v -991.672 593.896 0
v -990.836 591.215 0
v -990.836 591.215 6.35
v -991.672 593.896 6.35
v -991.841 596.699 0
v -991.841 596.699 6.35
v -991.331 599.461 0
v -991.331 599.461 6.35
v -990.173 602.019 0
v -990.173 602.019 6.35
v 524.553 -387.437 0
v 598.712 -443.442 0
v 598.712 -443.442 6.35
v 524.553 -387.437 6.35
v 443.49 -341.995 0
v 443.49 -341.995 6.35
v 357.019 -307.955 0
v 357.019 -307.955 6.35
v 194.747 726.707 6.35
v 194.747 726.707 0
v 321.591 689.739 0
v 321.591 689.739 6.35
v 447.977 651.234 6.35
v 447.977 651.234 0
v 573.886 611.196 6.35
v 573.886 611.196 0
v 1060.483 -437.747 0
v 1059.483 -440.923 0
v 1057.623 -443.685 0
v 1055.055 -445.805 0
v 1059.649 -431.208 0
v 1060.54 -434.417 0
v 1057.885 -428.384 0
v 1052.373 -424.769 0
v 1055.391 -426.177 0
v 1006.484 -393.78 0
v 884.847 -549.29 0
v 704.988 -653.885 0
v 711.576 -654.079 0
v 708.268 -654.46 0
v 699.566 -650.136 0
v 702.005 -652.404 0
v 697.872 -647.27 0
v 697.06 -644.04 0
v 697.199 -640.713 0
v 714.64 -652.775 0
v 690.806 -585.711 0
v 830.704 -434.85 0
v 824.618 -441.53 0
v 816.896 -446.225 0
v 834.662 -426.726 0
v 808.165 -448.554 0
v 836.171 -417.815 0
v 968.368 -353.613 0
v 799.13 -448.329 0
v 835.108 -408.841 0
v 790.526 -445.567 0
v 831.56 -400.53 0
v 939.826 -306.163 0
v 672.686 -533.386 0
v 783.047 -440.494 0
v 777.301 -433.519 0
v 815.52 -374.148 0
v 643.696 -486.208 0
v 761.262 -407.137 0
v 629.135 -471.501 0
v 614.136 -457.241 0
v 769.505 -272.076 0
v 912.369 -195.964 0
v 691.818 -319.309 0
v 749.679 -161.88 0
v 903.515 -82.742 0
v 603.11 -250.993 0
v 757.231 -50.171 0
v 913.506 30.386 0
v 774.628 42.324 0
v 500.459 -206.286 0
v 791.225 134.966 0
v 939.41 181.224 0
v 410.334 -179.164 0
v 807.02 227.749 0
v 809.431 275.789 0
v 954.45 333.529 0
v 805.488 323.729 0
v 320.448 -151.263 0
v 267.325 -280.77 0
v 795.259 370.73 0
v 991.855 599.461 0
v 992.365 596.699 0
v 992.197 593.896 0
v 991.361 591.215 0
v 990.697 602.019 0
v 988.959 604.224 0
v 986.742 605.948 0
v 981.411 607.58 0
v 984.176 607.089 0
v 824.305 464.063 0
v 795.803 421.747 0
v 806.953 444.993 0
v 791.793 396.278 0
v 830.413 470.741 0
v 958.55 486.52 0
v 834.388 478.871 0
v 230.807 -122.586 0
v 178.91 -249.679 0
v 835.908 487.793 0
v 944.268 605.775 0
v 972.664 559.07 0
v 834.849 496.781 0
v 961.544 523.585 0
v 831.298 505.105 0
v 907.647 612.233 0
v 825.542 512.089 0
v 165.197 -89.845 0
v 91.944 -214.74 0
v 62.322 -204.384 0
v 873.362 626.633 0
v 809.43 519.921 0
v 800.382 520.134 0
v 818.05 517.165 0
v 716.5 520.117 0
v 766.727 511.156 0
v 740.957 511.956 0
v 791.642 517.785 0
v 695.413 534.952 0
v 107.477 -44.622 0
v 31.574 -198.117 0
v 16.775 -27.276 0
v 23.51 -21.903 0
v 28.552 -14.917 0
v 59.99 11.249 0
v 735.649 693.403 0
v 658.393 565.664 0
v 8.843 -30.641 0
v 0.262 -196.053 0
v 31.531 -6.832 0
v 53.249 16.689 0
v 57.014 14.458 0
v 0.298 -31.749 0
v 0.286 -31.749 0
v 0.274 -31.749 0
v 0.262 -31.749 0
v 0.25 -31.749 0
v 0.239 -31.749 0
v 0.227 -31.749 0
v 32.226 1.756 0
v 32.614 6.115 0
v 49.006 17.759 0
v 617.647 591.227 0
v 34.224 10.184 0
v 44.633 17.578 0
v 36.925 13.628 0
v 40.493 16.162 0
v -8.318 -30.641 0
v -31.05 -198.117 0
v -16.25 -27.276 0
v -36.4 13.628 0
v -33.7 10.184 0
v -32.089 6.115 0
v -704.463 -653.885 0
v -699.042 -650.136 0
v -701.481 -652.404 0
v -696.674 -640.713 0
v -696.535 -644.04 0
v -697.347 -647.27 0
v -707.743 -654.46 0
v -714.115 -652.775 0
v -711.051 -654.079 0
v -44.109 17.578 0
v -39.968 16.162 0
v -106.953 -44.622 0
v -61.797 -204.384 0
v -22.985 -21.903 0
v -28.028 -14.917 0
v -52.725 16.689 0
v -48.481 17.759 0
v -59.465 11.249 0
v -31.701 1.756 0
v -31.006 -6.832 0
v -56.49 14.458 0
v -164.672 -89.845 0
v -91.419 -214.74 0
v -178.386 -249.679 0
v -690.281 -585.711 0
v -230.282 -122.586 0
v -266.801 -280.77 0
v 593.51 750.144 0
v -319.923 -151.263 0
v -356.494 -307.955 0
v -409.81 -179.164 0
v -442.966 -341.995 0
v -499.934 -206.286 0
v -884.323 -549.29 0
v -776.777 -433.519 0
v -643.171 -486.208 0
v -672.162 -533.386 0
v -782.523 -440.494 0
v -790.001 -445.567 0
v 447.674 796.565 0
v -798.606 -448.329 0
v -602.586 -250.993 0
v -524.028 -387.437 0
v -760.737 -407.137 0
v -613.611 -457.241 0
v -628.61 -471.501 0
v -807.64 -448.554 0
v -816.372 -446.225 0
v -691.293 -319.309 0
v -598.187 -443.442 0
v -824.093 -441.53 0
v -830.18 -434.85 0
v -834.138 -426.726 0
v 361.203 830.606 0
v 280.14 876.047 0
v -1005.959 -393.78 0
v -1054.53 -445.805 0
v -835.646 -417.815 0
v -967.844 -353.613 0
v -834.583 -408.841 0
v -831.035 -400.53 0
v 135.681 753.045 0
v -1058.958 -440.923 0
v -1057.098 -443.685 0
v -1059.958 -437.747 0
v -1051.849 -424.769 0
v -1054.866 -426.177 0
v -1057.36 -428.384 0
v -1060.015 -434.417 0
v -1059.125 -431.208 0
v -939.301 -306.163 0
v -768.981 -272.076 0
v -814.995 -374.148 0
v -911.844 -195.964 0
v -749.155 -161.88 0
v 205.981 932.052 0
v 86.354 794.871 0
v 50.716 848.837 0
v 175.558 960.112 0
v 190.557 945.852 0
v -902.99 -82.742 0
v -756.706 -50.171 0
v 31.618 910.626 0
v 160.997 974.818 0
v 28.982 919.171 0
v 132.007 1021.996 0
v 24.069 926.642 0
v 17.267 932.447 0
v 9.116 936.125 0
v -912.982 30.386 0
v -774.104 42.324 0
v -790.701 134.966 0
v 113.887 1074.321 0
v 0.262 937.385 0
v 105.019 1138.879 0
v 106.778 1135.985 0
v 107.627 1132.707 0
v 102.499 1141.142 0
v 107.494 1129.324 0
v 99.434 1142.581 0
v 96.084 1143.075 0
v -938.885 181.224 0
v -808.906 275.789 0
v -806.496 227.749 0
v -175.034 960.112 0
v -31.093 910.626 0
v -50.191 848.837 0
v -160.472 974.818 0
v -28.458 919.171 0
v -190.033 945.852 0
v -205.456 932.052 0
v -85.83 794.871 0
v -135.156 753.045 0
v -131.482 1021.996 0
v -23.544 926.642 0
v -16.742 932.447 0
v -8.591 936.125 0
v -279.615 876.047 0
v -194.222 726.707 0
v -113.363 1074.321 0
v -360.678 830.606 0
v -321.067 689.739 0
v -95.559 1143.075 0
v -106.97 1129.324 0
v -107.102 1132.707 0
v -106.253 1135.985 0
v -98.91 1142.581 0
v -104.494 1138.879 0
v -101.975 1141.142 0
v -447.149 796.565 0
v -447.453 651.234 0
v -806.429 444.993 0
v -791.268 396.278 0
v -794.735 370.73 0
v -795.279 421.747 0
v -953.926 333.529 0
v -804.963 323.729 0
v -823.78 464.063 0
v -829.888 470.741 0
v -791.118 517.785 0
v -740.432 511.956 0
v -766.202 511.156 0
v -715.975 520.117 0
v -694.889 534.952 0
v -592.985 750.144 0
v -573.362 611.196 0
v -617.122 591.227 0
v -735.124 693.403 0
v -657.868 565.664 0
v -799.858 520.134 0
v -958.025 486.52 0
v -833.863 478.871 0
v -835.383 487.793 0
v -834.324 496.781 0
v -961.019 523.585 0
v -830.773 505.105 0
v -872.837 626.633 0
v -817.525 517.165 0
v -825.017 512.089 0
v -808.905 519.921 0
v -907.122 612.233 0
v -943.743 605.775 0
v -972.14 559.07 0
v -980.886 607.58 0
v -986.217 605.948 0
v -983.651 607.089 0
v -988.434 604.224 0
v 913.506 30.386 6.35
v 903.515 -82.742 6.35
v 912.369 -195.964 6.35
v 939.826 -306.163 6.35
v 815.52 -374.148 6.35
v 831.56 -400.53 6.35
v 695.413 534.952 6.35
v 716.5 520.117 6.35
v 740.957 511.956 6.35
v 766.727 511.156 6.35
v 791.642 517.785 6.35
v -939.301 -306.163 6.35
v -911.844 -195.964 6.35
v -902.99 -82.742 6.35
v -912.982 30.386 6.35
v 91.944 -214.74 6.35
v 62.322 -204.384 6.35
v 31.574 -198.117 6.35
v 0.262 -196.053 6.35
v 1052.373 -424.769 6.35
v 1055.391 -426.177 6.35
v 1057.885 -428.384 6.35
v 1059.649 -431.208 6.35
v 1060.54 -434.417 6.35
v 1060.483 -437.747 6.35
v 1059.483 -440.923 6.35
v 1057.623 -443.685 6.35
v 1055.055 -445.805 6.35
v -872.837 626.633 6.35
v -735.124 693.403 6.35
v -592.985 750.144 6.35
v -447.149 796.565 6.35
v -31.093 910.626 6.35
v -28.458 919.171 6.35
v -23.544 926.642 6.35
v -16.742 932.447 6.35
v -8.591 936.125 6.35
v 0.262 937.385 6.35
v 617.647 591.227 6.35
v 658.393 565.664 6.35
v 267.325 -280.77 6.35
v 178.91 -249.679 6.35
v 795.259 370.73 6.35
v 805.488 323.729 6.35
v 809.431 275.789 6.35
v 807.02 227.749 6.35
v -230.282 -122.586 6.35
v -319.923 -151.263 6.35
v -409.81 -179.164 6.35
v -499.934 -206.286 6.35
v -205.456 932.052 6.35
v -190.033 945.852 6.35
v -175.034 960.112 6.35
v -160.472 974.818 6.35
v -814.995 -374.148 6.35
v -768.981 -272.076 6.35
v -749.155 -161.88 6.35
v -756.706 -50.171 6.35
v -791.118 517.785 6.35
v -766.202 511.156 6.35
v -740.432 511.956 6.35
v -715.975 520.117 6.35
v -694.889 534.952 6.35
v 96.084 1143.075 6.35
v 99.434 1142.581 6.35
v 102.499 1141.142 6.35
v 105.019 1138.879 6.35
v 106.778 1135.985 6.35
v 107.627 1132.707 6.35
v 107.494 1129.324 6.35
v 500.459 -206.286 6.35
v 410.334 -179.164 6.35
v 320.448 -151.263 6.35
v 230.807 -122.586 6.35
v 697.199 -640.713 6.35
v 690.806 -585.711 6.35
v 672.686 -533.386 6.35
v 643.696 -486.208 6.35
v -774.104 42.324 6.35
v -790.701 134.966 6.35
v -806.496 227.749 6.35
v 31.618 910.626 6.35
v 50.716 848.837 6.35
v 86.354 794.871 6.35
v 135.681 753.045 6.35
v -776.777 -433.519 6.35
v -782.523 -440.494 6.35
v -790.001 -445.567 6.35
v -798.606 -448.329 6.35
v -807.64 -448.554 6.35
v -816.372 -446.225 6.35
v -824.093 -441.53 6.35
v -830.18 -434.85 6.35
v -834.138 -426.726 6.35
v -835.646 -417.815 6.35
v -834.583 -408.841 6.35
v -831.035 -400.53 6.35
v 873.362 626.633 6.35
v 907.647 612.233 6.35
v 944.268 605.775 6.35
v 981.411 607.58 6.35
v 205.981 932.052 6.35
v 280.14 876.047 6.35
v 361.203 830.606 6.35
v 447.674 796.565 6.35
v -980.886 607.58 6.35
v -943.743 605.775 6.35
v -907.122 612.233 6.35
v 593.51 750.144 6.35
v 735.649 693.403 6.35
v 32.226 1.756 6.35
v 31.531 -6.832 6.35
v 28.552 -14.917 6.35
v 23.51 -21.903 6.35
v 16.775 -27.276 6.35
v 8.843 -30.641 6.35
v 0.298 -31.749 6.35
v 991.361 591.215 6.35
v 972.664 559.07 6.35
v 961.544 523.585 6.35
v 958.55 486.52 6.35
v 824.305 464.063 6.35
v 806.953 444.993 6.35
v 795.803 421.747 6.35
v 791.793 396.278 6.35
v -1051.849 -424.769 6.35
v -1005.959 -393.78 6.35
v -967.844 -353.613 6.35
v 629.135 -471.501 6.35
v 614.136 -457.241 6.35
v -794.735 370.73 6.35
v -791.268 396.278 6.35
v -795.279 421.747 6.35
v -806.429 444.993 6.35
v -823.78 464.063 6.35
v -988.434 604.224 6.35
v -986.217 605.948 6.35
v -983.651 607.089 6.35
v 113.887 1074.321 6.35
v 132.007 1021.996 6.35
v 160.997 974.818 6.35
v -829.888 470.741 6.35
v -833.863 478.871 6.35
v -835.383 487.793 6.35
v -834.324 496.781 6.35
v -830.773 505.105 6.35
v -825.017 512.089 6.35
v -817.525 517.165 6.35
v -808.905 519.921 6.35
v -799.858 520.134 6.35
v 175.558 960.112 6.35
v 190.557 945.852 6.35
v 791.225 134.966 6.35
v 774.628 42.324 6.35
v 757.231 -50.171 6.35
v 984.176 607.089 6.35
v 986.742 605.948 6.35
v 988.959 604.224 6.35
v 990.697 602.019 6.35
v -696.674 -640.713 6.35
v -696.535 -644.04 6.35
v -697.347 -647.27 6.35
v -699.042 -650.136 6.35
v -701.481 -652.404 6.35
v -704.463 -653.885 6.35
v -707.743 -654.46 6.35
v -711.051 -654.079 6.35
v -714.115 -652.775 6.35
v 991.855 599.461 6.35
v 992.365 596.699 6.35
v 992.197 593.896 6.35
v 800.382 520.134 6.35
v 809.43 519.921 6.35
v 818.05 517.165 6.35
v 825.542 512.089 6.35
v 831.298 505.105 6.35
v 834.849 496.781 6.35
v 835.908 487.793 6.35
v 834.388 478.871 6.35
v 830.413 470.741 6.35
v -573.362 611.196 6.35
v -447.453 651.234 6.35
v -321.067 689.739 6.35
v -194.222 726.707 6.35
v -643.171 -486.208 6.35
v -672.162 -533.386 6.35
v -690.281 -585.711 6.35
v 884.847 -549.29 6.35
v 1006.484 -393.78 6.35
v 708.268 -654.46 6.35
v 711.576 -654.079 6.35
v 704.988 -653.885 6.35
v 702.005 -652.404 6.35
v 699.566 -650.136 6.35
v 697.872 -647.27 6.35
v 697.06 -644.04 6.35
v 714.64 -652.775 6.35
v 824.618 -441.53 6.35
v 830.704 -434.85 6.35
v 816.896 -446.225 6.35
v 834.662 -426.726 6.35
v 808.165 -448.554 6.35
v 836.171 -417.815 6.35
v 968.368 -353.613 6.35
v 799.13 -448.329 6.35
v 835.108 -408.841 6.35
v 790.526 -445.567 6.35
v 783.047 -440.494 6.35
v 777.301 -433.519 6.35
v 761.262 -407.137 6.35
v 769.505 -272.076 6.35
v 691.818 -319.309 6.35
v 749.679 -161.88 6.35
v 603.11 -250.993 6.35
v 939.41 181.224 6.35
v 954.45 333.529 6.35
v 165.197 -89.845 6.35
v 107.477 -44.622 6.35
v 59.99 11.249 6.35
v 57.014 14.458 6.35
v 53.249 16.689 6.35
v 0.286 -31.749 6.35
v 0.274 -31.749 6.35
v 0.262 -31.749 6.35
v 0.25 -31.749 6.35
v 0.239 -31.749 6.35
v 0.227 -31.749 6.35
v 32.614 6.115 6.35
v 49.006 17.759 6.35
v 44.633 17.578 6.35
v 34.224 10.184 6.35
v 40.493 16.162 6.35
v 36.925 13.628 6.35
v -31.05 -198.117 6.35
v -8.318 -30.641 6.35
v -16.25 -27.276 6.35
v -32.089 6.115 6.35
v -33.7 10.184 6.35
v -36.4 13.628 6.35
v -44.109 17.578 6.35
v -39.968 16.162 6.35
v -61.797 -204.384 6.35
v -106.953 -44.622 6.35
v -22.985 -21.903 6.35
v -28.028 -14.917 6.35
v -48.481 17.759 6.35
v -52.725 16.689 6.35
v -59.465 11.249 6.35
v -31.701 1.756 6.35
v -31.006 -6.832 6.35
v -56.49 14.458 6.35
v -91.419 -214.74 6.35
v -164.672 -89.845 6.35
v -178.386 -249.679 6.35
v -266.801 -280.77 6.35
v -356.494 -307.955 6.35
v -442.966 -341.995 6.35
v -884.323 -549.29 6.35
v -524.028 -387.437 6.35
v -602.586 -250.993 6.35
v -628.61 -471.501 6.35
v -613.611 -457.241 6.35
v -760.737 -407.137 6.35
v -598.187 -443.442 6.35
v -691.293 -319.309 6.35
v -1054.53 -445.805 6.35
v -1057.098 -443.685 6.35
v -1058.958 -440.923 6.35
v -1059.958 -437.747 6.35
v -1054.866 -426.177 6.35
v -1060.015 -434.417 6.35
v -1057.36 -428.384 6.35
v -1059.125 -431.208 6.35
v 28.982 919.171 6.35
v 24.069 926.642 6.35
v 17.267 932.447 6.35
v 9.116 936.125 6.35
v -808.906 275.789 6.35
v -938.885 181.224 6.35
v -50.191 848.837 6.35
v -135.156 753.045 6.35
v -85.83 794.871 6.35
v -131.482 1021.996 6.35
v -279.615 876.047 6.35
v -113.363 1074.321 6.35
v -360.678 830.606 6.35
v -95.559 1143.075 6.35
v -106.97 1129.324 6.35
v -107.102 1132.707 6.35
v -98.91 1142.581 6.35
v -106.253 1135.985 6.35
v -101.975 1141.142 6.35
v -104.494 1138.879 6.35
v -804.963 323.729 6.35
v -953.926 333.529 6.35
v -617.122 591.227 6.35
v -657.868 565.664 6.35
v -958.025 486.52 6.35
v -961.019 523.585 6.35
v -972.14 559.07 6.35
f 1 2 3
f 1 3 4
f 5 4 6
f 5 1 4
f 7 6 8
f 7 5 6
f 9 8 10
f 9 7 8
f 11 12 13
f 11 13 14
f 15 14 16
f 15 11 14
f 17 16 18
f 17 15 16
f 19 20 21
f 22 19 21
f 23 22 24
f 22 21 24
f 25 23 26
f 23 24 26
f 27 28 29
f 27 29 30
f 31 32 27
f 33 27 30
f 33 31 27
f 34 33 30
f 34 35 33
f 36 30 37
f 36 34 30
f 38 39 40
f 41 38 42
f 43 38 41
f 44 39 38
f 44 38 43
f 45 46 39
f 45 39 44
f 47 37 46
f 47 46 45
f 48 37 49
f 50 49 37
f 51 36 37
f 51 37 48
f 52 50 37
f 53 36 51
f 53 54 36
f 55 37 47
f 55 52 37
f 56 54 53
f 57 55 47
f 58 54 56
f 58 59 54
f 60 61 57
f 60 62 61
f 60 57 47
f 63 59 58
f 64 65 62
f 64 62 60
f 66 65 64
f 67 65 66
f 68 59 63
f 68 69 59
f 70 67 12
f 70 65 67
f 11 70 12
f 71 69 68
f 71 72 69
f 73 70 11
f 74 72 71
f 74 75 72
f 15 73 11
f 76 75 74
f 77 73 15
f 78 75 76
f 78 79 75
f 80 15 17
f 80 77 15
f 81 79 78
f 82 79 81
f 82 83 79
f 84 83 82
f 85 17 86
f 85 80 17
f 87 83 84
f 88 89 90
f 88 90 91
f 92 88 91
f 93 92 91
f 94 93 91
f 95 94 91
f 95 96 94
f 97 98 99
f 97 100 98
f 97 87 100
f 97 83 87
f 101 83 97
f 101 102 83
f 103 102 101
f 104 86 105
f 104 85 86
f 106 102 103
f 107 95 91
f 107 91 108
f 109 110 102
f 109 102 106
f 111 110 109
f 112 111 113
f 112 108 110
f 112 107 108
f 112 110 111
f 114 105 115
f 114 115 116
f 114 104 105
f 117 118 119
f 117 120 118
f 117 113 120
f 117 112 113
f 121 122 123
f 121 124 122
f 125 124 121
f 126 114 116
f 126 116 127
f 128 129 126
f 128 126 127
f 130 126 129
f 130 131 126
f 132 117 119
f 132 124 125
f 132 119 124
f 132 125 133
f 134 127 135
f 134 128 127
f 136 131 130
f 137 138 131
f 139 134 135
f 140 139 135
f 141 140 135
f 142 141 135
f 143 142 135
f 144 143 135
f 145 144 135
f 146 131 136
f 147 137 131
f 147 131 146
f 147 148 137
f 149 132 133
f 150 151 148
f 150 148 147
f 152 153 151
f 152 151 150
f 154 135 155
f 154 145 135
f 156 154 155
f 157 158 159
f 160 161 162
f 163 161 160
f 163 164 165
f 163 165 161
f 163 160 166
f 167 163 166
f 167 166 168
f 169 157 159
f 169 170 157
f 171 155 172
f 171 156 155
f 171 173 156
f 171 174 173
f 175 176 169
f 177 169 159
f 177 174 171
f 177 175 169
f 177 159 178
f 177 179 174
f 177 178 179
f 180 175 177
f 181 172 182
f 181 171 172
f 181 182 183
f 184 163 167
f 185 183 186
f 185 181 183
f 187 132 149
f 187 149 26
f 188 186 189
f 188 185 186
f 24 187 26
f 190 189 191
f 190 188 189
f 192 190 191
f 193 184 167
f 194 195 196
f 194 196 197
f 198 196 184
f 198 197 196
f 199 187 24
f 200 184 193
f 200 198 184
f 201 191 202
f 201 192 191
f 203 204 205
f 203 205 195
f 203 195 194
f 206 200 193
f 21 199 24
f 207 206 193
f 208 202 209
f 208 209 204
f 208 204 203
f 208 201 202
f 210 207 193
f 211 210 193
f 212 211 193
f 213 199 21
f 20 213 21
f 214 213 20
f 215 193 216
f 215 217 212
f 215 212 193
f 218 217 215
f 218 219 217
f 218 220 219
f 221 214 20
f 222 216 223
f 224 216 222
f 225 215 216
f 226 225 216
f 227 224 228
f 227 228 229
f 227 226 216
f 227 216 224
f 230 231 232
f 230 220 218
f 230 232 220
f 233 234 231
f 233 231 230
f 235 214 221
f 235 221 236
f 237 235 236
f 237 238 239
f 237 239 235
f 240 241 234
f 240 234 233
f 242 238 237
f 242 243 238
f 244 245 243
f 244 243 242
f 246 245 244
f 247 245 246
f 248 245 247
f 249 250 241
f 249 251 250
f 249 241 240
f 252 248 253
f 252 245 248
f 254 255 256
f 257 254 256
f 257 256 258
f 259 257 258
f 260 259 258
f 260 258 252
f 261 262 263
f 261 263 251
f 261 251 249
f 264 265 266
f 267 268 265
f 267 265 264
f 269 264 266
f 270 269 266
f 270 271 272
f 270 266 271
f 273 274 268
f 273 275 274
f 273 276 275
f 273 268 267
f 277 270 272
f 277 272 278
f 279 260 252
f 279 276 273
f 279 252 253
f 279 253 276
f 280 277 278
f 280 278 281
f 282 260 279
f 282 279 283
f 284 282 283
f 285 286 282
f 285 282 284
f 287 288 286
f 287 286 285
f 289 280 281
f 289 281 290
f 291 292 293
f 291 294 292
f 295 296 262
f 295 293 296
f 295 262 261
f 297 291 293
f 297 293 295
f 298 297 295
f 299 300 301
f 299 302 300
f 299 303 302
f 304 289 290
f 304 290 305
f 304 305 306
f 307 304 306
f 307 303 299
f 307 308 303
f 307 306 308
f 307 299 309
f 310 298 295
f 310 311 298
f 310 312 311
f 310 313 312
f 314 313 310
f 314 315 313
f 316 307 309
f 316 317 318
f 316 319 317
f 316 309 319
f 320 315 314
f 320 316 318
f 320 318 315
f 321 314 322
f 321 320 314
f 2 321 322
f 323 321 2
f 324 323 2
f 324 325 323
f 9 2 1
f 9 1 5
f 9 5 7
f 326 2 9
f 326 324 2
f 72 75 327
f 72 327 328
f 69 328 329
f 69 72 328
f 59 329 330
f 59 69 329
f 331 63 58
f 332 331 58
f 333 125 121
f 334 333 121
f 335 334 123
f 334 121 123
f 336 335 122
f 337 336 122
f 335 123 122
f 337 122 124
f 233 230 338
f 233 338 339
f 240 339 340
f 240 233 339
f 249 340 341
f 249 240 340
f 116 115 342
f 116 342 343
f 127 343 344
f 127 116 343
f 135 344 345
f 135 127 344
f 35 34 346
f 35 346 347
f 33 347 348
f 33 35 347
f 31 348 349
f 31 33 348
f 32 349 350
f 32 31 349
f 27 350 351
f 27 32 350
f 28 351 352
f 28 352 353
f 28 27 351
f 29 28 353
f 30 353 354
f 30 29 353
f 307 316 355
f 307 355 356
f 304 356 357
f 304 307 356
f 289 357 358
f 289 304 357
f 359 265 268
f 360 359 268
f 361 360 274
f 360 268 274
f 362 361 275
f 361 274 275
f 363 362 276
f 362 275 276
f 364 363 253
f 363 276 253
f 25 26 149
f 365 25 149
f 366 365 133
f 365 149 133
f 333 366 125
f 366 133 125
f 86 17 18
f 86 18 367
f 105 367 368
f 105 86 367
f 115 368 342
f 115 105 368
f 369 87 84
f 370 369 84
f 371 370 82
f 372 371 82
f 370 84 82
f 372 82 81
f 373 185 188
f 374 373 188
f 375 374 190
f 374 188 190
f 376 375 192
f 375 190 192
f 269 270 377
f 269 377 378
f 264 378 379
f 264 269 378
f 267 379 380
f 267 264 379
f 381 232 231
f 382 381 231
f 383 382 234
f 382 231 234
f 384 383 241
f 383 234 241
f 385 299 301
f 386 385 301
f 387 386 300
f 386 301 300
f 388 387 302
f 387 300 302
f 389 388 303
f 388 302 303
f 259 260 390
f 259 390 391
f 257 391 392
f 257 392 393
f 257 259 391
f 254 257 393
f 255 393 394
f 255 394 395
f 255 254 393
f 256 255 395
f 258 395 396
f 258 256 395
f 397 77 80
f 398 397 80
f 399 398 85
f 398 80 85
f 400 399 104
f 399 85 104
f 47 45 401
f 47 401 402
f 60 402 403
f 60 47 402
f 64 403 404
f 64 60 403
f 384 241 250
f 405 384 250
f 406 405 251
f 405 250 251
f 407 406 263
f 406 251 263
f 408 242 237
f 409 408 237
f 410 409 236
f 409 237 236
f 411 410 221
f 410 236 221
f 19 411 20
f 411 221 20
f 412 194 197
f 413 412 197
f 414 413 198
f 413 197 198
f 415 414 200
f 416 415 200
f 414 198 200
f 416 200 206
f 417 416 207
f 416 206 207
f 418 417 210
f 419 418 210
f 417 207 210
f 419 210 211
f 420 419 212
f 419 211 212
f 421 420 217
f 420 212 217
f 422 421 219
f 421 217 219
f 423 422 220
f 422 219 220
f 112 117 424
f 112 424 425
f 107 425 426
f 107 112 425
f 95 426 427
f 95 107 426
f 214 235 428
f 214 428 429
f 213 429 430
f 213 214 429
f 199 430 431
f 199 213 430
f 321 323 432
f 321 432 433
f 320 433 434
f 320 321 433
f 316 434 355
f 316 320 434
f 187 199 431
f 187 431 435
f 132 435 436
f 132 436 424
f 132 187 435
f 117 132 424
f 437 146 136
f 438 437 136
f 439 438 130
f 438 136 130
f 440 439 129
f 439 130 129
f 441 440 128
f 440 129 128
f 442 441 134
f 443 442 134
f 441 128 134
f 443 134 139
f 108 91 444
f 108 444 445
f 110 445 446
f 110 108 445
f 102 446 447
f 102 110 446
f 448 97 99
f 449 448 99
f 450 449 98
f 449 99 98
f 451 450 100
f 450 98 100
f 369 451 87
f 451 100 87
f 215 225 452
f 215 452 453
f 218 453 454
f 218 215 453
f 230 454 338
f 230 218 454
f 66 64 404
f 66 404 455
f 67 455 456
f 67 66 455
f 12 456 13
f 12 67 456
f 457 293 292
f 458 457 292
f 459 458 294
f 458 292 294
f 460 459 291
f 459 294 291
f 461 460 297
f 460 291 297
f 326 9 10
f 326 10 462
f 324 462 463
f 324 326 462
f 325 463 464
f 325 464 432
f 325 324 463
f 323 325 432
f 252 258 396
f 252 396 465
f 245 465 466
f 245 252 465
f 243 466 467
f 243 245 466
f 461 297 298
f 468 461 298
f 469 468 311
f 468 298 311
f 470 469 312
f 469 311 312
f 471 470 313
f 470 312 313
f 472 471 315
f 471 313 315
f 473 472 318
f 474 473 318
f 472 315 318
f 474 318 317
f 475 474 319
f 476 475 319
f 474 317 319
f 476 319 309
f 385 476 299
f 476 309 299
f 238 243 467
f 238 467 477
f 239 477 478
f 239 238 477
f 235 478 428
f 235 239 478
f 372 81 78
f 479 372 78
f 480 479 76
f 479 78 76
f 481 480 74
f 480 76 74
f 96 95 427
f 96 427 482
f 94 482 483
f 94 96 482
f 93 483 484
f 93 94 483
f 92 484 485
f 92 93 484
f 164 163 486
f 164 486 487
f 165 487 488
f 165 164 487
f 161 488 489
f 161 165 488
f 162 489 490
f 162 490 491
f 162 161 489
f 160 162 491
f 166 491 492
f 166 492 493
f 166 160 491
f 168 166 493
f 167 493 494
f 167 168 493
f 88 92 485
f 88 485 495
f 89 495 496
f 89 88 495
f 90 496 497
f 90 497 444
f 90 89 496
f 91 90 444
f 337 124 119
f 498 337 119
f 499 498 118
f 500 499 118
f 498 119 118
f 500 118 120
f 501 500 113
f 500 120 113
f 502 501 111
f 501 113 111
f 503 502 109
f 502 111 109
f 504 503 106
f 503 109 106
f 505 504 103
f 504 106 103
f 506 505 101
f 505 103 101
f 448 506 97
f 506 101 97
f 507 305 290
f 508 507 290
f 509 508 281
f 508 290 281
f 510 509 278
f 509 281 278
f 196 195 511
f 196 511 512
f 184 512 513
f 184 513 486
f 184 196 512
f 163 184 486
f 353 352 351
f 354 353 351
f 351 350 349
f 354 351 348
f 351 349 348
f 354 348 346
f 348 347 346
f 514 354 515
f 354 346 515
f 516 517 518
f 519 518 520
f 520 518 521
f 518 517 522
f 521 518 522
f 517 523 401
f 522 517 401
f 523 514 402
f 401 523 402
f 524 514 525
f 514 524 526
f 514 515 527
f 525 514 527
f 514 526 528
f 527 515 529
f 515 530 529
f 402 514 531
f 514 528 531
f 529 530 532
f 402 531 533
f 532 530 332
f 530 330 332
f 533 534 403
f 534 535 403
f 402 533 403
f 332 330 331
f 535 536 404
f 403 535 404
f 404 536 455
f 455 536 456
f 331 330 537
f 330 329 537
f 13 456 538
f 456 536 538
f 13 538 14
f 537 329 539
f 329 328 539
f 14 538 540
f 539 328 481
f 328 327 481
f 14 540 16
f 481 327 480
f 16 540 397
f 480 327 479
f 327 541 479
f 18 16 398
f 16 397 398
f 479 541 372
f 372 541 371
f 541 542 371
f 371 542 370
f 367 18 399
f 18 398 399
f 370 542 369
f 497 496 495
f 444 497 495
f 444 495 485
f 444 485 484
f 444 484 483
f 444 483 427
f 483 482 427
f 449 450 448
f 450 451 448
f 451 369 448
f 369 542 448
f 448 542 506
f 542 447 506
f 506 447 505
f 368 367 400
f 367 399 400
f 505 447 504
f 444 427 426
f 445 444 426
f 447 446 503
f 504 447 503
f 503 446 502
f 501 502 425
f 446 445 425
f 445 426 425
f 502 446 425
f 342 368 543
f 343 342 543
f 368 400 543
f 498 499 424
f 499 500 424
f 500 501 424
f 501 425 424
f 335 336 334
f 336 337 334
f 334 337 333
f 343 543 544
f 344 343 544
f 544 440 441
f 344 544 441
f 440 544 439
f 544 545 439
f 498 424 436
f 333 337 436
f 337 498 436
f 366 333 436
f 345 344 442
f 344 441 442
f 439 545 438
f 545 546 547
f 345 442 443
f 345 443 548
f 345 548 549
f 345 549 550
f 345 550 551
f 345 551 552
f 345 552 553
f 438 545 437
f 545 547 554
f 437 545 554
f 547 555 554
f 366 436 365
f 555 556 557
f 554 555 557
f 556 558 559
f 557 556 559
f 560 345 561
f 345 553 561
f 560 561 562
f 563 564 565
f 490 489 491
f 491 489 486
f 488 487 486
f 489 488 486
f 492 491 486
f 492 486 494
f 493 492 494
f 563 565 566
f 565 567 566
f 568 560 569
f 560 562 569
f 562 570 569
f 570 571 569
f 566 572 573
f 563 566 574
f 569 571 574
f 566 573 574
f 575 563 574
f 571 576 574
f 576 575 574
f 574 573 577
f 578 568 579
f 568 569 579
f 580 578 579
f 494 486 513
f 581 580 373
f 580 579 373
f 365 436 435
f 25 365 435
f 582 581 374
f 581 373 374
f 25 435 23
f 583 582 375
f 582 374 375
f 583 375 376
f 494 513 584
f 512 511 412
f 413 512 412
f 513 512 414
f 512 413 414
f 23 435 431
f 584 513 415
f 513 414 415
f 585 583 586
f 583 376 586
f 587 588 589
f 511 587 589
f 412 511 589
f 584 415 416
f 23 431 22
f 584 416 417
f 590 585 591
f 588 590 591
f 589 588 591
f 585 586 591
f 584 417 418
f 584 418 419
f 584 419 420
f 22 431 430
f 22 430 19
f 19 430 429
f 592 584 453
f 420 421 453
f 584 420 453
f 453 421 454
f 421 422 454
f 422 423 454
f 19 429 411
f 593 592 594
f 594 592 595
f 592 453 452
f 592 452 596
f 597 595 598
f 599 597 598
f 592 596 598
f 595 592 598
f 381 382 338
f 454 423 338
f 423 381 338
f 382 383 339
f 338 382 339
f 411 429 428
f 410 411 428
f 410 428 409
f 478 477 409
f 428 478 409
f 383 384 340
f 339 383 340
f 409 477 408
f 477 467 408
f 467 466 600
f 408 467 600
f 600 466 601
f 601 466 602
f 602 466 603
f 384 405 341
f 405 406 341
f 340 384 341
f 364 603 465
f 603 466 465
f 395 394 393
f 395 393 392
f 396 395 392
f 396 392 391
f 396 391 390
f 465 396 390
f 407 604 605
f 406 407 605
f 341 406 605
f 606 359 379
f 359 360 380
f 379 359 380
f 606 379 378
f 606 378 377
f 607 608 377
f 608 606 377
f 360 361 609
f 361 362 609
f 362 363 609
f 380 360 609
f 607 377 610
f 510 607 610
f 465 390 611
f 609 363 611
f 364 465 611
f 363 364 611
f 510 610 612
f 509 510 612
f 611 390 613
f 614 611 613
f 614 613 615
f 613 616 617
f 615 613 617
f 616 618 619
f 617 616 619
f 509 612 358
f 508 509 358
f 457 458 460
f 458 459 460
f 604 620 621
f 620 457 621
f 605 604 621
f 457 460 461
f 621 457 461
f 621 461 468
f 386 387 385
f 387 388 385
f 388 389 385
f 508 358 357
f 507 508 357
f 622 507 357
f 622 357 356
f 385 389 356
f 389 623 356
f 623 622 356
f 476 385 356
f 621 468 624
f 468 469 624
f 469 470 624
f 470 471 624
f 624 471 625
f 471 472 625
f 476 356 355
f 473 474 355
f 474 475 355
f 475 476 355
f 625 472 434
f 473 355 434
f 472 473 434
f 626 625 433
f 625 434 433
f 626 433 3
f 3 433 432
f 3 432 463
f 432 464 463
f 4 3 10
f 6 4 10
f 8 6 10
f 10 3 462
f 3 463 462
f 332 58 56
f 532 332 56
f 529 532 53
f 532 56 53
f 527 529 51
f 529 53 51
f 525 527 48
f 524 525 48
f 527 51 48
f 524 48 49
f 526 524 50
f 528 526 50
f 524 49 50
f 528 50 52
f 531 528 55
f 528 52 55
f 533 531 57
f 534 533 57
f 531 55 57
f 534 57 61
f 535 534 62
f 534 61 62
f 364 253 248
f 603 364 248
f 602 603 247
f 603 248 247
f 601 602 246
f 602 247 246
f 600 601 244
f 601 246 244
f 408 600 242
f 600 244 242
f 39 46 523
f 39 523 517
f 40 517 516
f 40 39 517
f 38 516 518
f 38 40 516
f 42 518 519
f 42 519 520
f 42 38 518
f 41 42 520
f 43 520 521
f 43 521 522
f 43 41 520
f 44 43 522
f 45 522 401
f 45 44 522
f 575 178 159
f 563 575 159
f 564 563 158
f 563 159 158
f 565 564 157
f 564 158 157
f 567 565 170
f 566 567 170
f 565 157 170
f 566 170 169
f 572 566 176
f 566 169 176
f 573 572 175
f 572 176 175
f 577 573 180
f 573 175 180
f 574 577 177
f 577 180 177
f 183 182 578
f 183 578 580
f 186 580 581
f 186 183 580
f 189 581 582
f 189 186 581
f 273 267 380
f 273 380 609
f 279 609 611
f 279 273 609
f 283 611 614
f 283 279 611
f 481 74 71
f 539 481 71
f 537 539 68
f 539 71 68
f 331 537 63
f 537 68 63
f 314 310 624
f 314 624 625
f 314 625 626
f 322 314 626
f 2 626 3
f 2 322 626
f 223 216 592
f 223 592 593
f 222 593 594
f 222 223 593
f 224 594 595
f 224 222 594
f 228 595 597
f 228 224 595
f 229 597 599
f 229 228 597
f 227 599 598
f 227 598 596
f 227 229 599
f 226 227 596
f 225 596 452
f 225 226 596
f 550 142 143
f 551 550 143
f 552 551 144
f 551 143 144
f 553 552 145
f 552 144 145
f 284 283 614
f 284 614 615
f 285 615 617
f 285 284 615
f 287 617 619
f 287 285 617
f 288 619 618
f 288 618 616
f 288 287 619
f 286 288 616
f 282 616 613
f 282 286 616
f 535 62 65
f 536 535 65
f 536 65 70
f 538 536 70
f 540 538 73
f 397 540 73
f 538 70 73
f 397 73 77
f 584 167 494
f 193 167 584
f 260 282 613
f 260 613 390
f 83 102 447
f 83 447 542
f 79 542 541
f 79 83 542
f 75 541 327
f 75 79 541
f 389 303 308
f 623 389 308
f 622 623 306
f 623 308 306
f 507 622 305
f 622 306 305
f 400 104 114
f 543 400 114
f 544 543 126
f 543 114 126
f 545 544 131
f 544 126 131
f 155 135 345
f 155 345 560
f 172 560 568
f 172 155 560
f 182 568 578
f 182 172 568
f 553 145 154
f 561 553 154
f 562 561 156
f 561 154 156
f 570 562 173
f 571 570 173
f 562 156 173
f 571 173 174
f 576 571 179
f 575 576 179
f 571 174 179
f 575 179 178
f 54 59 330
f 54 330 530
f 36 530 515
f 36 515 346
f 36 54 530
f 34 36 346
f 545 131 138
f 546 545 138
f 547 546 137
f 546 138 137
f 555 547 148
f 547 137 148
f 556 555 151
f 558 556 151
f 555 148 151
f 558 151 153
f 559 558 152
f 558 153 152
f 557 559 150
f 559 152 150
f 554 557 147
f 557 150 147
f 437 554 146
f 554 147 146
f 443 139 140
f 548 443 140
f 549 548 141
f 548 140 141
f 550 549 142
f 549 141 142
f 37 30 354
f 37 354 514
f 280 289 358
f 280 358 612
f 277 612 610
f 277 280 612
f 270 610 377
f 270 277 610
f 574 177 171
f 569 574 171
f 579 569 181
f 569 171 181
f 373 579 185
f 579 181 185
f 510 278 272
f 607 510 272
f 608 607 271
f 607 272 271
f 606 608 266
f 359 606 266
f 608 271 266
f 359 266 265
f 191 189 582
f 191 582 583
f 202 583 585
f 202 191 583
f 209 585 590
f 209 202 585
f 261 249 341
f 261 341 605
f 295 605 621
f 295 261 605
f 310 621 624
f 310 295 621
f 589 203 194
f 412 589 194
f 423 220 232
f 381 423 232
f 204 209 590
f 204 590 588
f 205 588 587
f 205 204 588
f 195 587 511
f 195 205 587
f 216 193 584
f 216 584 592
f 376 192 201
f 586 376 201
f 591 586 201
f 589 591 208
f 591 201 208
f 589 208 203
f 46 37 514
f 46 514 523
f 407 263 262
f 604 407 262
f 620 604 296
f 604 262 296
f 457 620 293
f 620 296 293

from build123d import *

# Parameters (mm, degrees)
BOSS_EXTRUDE1_DEPTH = 6.35


with BuildPart() as part:
    # Model → Boss-Extrude1 (new body)
    with BuildSketch(Plane.XY):
        with BuildLine():
            Line((-1054.530174704, -445.805078084), (-884.322818744, -549.29009194))
            Line((-884.322818744, -549.29009194), (-714.115462784, -652.775105795))
            ThreePointArc((-714.115462784, -652.775105795), (-701.480767956, -652.403779037), (-696.673957546, -640.713271323))
            ThreePointArc((-696.673957546, -640.713271323), (-682.646209507, -559.054736821), (-643.171312347, -486.208141388))
            ThreePointArc((-643.171312347, -486.208141388), (-621.164389939, -464.314654904), (-598.187283298, -443.44165908))
            ThreePointArc((-598.187283298, -443.44165908), (-484.269299036, -363.338503482), (-356.49421429, -307.954838084))
            ThreePointArc((-356.49421429, -307.954838084), (-222.422842463, -265.70956843), (-91.419363532, -214.740126023))
            ThreePointArc((-91.419363532, -214.740126023), (-46.529578977, -200.730515706), (0.262323317, -196.052928909))
            ThreePointArc((0.262323317, -196.052928909), (47.054225612, -200.730515706), (91.944010166, -214.740126023))
            ThreePointArc((91.944010166, -214.740126023), (222.947489099, -265.709568431), (357.018860928, -307.954838085))
            ThreePointArc((357.018860928, -307.954838085), (484.793945672, -363.338503483), (598.711929932, -443.44165908))
            ThreePointArc((598.711929932, -443.44165908), (621.689036573, -464.314654904), (643.695958982, -486.208141388))
            ThreePointArc((643.695958982, -486.208141388), (683.170856142, -559.054736821), (697.19860418, -640.713271323))
            ThreePointArc((697.19860418, -640.713271323), (702.005414591, -652.403779037), (714.640109418, -652.775105795))
            Line((714.640109418, -652.775105795), (884.847465378, -549.29009194))
            Line((884.847465378, -549.29009194), (1055.054821338, -445.805078084))
            ThreePointArc((1055.054821338, -445.805078084), (1060.539897468, -434.417043276), (1052.373199847, -424.76932609))
            ThreePointArc((1052.373199847, -424.76932609), (986.332213878, -374.734516765), (939.825801838, -306.163038647))
            ThreePointArc((939.825801838, -306.163038647), (905.589204406, -139.536796819), (913.506255339, 30.386036768))
            ThreePointArc((913.506255339, 30.386036768), (948.294313295, 257.241539714), (958.549670474, 486.519658693))
            ThreePointArc((958.549670474, 486.519658693), (966.113332281, 541.638264925), (991.360607576, 591.214920954))
            ThreePointArc((991.360607576, 591.214920954), (992.365203384, 596.69892445), (990.697417794, 602.018886698))
            ThreePointArc((990.697417794, 602.018886698), (986.741878389, 605.947908853), (981.410818468, 607.57987307))
            ThreePointArc((981.410818468, 607.57987307), (925.777119065, 607.981399504), (873.361605838, 626.633040341))
            ThreePointArc((873.361605838, 626.633040341), (665.08766839, 723.046707283), (447.674096575, 796.565187843))
            ThreePointArc((447.674096575, 796.565187843), (319.899011826, 851.948853241), (205.981027563, 932.05200884))
            ThreePointArc((205.981027563, 932.05200884), (183.003920922, 952.925004664), (160.996998513, 974.818491148))
            ThreePointArc((160.996998513, 974.818491148), (121.522101353, 1047.665086581), (107.494353315, 1129.323621083))
            ThreePointArc((107.494353315, 1129.323621083), (105.018531072, 1138.878845883), (96.08411041, 1143.075051813))
            Line((96.08411041, 1143.075051813), (0.262323317, 1143.075051813))
            Line((0.262323317, 1143.075051813), (-95.559463776, 1143.075051813))
            ThreePointArc((-95.559463776, 1143.075051813), (-104.493884438, 1138.878845883), (-106.969706681, 1129.323621083))
            ThreePointArc((-106.969706681, 1129.323621083), (-120.997454719, 1047.665086581), (-160.472351879, 974.818491148))
            ThreePointArc((-160.472351879, 974.818491148), (-182.479274288, 952.925004664), (-205.456380929, 932.05200884))
            ThreePointArc((-205.456380929, 932.05200884), (-319.374365192, 851.948853241), (-447.149449941, 796.565187843))
            ThreePointArc((-447.149449941, 796.565187843), (-664.563021755, 723.046707284), (-872.836959201, 626.633040343))
            ThreePointArc((-872.836959201, 626.633040343), (-925.252472429, 607.981399504), (-980.886171834, 607.57987307))
            ThreePointArc((-980.886171834, 607.57987307), (-986.217231755, 605.947908853), (-990.17277116, 602.018886698))
            ThreePointArc((-990.17277116, 602.018886698), (-991.84055675, 596.69892445), (-990.835960942, 591.214920954))
            ThreePointArc((-990.835960942, 591.214920954), (-965.588685647, 541.638264925), (-958.02502384, 486.519658693))
            ThreePointArc((-958.02502384, 486.519658693), (-947.769666661, 257.241539714), (-912.981608705, 30.386036767))
            ThreePointArc((-912.981608705, 30.386036767), (-905.064557772, -139.536796819), (-939.301155204, -306.163038647))
            ThreePointArc((-939.301155204, -306.163038647), (-985.807567244, -374.734516765), (-1051.848553213, -424.76932609))
            ThreePointArc((-1051.848553213, -424.76932609), (-1060.015250834, -434.417043276), (-1054.530174704, -445.805078084))
        make_face()
        with BuildLine():
            ThreePointArc((-776.776730114, -433.518633987), (-820.400407489, -444.153471661), (-831.035245163, -400.529794286))
            Line((-831.035245163, -400.529794286), (-814.995386538, -374.148178004))
            ThreePointArc((-814.995386538, -374.148178004), (-755.681673534, -217.587288079), (-756.705863237, -50.170503258))
            ThreePointArc((-756.705863237, -50.170503258), (-782.502405832, 88.627483964), (-806.4955468, 227.748553731))
            ThreePointArc((-806.4955468, 227.748553731), (-807.727163724, 299.824157666), (-794.734772679, 370.729780417))
            ThreePointArc((-794.734772679, 370.729780417), (-795.278719619, 421.74664414), (-823.780399516, 464.062959025))
            ThreePointArc((-823.780399516, 464.062959025), (-830.772921751, 505.10476961), (-791.117705256, 517.785045164))
            ThreePointArc((-791.117705256, 517.785045164), (-740.432028836, 511.955939897), (-694.888676898, 534.952012531))
            ThreePointArc((-694.888676898, 534.952012531), (-637.917685406, 579.118919726), (-573.361803176, 611.196133327))
            ThreePointArc((-573.361803176, 611.196133327), (-384.318244806, 670.678328168), (-194.222460106, 726.706812923))
            ThreePointArc((-194.222460106, 726.706812923), (-85.829836181, 794.87078756), (-31.092943269, 910.625532232))
            ThreePointArc((-31.092943269, 910.625532232), (-20.348344787, 929.785400257), (0.262323317, 937.384564654))
            ThreePointArc((0.262323317, 937.384564654), (20.872991421, 929.785400257), (31.617589903, 910.625532232))
            ThreePointArc((31.617589903, 910.625532232), (86.354482821, 794.870787553), (194.747106759, 726.706812918))
            ThreePointArc((194.747106759, 726.706812918), (384.842891449, 670.678328165), (573.886449811, 611.196133327))
            ThreePointArc((573.886449811, 611.196133327), (638.44233204, 579.118919726), (695.413323532, 534.952012531))
            ThreePointArc((695.413323532, 534.952012531), (740.95667547, 511.955939897), (791.642351891, 517.785045164))
            ThreePointArc((791.642351891, 517.785045164), (831.297568385, 505.10476961), (824.30504615, 464.062959025))
            ThreePointArc((824.30504615, 464.062959025), (795.803366253, 421.74664414), (795.259419313, 370.729780417))
            ThreePointArc((795.259419313, 370.729780417), (808.251810359, 299.824157666), (807.020193434, 227.748553731))
            ThreePointArc((807.020193434, 227.748553731), (783.027052467, 88.627483964), (757.230509871, -50.170503258))
            ThreePointArc((757.230509871, -50.170503258), (756.206320168, -217.587288079), (815.520033172, -374.148178004))
            Line((815.520033172, -374.148178004), (831.559891797, -400.529794286))
            ThreePointArc((831.559891797, -400.529794286), (820.925054123, -444.153471661), (777.301376749, -433.518633987))
            Line((777.301376749, -433.518633987), (761.261518123, -407.137017703))
            ThreePointArc((761.261518123, -407.137017703), (649.563377324, -282.425534082), (500.458599124, -206.28622805))
            ThreePointArc((500.458599124, -206.28622805), (365.360989591, -165.310884678), (230.806507684, -122.585783567))
            ThreePointArc((230.806507684, -122.585783567), (135.195604422, -68.689901345), (59.989781623, 11.249420395))
            ThreePointArc((59.989781623, 11.249420395), (42.5119564, 17.019369979), (32.226042951, 1.756124019))
            ThreePointArc((32.226042951, 1.756124019), (23.509796029, -21.903091273), (0.298037309, -31.7491913))
            ThreePointArc((0.298037309, -31.7491913), (0.280180346, -31.749313732), (0.262323317, -31.749426121))
            ThreePointArc((0.262323317, -31.749426121), (0.244466288, -31.749313732), (0.226609326, -31.7491913))
            ThreePointArc((0.226609326, -31.7491913), (-22.985149395, -21.903091273), (-31.701396317, 1.756124019))
            ThreePointArc((-31.701396317, 1.756124019), (-41.987309766, 17.019369979), (-59.465134989, 11.249420395))
            ThreePointArc((-59.465134989, 11.249420395), (-134.670957788, -68.689901345), (-230.28186105, -122.585783567))
            ThreePointArc((-230.28186105, -122.585783567), (-364.836342957, -165.310884677), (-499.93395249, -206.28622805))
            ThreePointArc((-499.93395249, -206.28622805), (-649.038730689, -282.425534082), (-760.736871489, -407.137017703))
            Line((-760.736871489, -407.137017703), (-776.776730114, -433.518633987))
        make_face(mode=Mode.SUBTRACT)
    extrude(amount=BOSS_EXTRUDE1_DEPTH)


solid = part.part
